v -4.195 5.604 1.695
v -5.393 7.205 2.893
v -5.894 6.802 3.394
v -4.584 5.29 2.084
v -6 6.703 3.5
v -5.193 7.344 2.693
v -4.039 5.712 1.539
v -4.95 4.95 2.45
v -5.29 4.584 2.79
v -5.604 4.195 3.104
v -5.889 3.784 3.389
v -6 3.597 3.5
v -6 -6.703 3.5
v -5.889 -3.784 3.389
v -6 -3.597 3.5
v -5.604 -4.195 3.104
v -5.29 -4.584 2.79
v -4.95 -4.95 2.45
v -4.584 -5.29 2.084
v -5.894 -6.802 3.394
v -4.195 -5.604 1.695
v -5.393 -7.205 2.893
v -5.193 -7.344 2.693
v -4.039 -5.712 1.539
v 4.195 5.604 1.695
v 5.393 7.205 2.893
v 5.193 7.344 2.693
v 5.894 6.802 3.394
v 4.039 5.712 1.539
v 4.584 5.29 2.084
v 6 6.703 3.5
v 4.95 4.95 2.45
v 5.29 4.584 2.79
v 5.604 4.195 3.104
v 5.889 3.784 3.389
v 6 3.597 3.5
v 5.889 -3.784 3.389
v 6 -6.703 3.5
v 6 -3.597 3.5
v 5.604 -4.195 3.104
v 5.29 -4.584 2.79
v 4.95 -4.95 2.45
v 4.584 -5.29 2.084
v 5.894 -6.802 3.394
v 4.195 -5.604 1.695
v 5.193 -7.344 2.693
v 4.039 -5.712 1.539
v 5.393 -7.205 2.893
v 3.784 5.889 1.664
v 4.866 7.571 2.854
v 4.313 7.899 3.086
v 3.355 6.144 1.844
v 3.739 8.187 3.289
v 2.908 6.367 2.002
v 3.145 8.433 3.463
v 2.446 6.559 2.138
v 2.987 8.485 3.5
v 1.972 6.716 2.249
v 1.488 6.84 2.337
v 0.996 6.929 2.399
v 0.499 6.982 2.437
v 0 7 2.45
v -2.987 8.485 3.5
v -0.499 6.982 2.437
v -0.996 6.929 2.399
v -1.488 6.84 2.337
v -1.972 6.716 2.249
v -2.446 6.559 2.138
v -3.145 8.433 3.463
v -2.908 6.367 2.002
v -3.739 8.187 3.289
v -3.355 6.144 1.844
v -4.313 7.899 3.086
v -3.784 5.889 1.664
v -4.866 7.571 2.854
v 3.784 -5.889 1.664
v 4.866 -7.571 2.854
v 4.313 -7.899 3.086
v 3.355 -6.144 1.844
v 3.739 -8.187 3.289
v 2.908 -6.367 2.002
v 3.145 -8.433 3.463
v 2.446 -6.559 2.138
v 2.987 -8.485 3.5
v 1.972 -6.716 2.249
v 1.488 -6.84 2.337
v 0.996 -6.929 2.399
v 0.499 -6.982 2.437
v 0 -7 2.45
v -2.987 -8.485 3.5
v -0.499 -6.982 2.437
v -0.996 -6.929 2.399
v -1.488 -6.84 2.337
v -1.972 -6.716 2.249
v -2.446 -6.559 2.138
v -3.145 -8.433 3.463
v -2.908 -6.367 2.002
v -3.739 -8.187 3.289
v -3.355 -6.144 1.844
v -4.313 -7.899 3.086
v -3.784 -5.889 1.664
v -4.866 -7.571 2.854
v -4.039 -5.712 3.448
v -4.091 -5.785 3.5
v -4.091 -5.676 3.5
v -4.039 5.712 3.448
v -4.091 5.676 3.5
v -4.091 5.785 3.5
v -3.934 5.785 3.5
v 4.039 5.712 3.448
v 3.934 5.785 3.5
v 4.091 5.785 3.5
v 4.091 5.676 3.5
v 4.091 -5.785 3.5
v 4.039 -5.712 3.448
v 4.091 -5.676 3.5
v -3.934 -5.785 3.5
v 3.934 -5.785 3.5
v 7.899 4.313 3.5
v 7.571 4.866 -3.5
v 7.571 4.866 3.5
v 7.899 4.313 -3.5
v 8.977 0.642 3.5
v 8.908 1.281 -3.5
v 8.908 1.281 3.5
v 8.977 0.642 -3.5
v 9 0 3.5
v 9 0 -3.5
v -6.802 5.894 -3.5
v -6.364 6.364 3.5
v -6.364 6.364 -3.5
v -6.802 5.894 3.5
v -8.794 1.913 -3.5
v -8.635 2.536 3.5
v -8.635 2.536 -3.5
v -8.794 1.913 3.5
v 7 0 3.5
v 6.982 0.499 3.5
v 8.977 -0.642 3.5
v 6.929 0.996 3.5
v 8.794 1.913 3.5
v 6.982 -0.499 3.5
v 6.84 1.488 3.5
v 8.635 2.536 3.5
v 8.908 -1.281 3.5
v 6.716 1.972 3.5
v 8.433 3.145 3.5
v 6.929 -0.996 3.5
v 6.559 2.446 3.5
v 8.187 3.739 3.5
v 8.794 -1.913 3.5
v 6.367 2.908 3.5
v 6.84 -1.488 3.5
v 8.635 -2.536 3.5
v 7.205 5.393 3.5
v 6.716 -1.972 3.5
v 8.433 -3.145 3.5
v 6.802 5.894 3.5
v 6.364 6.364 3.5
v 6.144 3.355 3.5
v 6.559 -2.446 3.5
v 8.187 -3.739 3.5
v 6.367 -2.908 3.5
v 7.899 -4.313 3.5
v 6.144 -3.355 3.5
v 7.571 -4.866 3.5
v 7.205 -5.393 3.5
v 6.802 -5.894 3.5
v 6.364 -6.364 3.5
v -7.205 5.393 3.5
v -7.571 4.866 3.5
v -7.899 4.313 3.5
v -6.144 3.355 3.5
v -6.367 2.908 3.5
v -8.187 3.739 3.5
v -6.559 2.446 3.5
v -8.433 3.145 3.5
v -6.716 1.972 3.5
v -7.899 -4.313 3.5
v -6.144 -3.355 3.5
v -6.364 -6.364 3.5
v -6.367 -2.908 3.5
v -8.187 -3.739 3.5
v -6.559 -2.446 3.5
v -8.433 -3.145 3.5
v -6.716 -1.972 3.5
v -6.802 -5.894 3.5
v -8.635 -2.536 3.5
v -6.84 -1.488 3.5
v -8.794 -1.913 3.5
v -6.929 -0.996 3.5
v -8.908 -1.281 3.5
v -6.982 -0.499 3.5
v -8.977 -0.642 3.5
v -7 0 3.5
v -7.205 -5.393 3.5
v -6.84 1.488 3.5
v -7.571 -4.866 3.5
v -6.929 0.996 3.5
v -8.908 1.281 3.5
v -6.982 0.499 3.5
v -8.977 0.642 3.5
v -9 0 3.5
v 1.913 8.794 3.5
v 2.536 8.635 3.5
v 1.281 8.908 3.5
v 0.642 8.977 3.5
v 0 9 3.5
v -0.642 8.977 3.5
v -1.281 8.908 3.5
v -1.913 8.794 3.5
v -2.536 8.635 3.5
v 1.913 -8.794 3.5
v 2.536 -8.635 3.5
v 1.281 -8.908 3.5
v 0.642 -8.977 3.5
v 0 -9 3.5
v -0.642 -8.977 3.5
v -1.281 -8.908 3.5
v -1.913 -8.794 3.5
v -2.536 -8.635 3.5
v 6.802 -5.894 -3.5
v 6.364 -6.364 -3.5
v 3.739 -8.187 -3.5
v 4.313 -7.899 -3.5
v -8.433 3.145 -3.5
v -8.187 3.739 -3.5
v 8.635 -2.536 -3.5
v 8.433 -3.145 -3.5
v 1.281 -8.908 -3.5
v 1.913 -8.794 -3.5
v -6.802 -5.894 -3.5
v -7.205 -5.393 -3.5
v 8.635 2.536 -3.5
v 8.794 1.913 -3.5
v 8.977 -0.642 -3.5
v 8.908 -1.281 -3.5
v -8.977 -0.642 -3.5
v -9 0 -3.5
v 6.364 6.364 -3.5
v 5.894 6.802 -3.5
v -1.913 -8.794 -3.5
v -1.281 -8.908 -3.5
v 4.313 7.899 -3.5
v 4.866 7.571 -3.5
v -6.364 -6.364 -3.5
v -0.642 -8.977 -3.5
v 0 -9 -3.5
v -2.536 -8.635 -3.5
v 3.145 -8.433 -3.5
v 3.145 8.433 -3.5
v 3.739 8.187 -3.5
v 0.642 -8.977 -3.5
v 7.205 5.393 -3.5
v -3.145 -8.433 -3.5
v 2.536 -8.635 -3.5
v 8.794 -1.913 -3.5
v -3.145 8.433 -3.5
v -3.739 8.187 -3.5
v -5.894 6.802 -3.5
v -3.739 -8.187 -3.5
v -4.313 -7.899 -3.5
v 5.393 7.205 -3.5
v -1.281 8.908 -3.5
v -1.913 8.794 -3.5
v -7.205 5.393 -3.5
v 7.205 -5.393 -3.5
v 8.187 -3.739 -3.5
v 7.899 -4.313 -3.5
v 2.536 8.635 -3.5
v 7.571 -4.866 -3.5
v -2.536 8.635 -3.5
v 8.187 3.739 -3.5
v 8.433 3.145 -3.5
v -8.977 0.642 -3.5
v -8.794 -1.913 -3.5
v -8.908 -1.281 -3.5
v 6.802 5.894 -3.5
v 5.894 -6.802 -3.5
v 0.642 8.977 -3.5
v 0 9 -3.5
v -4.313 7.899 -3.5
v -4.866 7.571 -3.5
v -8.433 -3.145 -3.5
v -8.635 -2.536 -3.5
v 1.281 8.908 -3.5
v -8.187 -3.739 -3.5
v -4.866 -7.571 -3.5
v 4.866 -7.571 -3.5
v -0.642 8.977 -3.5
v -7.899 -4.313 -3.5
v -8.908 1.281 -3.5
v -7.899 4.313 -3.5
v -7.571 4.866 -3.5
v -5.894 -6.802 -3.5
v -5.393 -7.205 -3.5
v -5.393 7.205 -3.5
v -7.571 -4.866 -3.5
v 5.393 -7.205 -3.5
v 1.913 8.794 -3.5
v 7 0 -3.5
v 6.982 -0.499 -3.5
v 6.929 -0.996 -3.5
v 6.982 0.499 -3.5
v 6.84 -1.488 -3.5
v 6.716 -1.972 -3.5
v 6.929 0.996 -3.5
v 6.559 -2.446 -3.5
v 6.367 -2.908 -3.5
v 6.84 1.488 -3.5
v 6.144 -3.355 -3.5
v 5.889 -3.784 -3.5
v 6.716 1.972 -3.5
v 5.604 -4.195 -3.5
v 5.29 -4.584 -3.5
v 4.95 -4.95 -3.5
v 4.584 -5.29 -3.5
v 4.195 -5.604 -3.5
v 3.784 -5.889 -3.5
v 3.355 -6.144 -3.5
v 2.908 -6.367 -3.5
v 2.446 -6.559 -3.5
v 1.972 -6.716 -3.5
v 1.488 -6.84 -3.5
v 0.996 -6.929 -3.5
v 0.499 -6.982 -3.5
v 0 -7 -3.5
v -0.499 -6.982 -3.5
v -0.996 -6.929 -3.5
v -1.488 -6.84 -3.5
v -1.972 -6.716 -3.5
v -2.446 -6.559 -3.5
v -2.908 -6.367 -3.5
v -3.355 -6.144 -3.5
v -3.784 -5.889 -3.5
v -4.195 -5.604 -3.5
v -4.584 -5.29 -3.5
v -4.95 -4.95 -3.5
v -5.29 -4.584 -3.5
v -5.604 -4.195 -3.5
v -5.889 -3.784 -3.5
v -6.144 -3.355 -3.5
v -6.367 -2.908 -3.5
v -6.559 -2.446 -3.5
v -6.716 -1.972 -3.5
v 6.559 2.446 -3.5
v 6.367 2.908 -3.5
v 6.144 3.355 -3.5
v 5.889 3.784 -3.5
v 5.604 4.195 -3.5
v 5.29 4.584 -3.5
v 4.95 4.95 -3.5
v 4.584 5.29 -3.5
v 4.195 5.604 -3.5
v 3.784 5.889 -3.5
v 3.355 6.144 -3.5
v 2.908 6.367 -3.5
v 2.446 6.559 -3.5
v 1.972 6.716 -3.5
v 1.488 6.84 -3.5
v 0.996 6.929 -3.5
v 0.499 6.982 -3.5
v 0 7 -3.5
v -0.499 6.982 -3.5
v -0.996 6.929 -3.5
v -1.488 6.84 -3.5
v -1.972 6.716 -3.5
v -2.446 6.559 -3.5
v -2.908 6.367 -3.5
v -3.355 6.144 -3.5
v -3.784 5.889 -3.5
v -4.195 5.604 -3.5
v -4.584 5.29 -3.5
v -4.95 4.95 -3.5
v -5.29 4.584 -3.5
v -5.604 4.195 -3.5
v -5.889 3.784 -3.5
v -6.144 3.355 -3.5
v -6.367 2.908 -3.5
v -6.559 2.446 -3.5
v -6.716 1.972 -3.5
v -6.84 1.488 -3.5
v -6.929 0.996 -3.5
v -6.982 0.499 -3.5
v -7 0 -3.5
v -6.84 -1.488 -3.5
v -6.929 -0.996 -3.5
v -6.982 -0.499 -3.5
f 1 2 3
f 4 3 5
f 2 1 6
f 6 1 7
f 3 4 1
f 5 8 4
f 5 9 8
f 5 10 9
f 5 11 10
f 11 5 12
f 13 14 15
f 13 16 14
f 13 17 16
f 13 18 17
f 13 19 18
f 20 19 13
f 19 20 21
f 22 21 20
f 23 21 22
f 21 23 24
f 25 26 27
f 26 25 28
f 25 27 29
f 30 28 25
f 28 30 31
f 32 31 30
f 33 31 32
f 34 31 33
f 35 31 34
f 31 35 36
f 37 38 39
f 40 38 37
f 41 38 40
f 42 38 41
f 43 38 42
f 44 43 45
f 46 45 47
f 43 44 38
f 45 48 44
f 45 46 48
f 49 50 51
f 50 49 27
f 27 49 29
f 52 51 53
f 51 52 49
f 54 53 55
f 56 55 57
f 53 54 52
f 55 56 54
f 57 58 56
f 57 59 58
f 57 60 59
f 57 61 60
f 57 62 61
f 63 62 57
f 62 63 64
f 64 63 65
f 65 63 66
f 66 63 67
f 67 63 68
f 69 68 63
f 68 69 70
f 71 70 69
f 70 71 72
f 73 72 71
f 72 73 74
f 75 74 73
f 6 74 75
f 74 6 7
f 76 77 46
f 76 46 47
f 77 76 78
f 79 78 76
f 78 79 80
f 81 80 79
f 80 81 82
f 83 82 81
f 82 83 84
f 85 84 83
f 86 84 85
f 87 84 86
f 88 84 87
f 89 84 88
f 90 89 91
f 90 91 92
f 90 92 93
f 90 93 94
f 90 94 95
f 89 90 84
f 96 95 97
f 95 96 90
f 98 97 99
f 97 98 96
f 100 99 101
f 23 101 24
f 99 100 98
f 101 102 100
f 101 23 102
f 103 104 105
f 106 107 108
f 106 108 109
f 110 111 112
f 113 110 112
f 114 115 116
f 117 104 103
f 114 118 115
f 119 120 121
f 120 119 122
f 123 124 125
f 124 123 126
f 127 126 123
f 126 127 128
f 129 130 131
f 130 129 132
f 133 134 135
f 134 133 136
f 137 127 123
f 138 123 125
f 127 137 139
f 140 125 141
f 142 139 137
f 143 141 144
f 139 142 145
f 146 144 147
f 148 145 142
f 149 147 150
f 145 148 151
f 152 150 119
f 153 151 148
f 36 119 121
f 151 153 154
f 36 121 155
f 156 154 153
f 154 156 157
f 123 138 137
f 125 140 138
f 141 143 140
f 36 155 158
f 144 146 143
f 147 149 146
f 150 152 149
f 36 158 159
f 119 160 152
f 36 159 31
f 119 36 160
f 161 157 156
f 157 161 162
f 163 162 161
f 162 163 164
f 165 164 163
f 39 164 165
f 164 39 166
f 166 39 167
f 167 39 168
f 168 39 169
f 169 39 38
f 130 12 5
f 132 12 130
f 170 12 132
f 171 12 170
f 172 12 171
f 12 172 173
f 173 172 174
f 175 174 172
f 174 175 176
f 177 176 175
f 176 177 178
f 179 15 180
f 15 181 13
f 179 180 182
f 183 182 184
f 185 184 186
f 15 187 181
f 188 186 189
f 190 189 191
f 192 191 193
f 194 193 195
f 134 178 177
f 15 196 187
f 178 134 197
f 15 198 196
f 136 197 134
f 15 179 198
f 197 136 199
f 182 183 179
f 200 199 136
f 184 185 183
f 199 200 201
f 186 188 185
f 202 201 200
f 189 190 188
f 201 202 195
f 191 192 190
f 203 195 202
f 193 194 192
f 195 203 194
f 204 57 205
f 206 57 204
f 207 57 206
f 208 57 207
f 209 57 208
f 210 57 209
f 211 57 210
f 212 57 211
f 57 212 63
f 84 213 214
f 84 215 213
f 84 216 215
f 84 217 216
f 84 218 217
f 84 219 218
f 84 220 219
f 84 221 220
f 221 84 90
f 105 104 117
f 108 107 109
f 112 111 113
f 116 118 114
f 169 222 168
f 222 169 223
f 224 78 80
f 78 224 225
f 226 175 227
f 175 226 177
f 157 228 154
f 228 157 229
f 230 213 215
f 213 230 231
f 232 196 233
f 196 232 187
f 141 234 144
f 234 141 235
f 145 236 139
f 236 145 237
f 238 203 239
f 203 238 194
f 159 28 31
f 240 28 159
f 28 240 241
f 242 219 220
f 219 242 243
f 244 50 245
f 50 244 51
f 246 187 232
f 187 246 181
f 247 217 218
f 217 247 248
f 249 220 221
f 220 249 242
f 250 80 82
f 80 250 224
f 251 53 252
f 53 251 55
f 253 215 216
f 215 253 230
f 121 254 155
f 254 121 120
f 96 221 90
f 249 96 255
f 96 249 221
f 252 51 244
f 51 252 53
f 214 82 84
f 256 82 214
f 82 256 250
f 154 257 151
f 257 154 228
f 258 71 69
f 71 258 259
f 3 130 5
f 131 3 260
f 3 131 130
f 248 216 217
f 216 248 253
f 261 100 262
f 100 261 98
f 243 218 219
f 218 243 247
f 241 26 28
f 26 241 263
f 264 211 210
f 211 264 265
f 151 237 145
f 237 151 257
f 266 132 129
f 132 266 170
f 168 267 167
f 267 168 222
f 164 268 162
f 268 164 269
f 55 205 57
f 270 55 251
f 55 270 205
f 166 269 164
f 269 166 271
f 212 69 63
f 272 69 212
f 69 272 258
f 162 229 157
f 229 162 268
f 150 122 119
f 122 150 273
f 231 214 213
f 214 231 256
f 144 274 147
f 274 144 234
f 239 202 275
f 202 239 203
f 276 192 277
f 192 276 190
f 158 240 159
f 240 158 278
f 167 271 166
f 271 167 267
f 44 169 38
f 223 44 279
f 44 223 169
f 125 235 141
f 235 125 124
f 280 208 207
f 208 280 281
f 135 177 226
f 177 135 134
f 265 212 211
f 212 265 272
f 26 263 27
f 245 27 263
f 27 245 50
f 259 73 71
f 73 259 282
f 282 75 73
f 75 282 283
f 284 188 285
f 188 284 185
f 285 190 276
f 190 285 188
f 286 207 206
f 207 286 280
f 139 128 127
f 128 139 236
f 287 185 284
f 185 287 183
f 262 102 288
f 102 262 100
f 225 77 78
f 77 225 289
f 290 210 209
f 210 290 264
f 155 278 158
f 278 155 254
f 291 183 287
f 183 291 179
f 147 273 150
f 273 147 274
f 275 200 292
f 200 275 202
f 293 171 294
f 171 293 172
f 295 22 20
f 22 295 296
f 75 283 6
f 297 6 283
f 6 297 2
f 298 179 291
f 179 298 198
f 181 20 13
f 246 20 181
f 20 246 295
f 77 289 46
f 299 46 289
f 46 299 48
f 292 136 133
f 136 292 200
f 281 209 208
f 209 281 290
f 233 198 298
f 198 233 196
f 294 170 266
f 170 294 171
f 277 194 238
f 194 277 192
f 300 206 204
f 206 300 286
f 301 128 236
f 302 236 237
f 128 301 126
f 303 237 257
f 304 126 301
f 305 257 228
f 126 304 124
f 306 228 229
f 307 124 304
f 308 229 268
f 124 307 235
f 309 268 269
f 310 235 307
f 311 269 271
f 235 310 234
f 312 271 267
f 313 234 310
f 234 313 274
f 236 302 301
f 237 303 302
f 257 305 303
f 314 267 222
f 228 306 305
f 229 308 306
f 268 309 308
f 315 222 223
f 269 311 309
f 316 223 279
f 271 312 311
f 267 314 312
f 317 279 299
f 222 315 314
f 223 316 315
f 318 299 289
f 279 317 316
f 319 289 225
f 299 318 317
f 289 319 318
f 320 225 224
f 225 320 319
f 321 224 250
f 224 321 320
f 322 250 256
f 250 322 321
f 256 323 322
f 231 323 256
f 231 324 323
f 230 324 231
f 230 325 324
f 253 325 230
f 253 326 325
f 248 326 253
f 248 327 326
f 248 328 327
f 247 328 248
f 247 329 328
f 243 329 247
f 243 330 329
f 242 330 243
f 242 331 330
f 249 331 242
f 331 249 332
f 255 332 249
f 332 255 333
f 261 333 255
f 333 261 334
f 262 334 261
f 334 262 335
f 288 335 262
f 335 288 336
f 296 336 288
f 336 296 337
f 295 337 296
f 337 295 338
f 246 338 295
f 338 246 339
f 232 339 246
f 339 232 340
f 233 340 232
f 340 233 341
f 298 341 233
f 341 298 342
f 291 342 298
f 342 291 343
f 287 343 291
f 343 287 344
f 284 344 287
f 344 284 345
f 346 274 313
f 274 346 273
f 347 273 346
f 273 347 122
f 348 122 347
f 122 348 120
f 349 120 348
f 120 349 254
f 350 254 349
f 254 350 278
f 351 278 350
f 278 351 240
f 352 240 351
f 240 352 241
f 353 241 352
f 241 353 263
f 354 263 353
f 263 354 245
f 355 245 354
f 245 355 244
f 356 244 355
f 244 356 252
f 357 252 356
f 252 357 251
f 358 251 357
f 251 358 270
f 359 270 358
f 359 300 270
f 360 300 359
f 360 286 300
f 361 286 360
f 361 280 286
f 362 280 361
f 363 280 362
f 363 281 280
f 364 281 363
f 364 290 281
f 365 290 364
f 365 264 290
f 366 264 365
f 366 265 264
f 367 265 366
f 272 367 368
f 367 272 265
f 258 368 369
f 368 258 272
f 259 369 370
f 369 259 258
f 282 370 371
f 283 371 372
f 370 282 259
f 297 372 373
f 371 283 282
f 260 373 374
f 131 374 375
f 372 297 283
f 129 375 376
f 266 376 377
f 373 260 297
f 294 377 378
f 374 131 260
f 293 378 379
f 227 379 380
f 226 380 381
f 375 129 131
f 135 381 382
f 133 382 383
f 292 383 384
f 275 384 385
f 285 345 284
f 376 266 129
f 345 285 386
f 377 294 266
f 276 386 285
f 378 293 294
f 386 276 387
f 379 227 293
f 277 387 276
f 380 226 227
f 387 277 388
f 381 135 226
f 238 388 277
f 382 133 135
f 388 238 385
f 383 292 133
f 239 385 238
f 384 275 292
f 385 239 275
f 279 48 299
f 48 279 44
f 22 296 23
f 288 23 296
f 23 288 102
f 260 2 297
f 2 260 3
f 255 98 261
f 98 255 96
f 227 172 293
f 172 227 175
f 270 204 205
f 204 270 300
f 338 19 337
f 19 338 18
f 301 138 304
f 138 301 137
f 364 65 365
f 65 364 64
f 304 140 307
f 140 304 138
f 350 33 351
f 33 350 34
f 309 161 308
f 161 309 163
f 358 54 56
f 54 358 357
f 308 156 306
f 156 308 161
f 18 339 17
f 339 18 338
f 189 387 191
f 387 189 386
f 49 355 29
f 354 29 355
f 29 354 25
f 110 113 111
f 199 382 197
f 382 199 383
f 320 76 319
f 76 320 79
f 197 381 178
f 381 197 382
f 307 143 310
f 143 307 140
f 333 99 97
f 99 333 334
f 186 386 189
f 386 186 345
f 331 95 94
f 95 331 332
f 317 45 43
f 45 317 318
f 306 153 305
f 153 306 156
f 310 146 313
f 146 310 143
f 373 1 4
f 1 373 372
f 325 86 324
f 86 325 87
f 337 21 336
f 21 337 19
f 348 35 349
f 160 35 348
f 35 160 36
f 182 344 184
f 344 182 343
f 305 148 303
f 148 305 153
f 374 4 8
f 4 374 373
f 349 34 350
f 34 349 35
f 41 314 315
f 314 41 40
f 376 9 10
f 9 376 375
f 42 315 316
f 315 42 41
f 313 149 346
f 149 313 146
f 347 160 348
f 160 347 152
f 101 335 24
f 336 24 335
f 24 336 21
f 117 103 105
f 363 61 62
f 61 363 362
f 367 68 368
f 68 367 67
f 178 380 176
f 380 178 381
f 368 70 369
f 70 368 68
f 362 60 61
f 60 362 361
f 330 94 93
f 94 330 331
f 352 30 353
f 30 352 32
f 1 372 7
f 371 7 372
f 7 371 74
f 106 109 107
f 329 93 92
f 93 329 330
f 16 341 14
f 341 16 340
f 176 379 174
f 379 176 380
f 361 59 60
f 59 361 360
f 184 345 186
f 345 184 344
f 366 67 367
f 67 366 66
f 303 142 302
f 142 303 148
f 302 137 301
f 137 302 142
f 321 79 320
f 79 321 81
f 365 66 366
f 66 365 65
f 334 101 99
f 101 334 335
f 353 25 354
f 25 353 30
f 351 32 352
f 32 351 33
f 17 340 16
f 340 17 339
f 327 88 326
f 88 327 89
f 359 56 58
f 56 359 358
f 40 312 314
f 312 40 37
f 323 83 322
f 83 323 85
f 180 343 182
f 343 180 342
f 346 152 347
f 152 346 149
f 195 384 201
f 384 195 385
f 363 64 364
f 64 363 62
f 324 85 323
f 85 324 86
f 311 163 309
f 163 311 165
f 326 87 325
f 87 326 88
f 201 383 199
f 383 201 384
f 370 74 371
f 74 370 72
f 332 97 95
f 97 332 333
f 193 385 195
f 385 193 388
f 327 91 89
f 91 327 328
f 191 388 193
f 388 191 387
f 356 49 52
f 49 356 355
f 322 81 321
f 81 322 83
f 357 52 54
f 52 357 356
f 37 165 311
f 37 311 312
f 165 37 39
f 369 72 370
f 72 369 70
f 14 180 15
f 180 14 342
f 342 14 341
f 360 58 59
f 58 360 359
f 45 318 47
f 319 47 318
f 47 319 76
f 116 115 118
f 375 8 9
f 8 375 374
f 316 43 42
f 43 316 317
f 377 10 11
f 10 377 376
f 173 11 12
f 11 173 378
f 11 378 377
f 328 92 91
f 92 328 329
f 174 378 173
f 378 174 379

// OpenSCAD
version = 4;

arete = 20;
paroi = 1.35;
trou_bouchon = 0;
diametreTrouBouchon = 1.5;
bottomHole = 0;
bottomHoleDiameter = 1.2;
vertexHole = 0;
vertexHolesDiameter = 1;
sideHole = 0;
sideHolesDiameter = 1.2;

// distance entre la paroi extérieure et la découpe
// minimum semble etre >nozzle_diameter pour Zortrax M200
offset_decoupe_bouchon = 0.42;

echelleReductionAjustementBouchon = 0.98;
r = 0.19; // résolution d'impression sur l'axe Z

externalRadius = arete;
internalRadius = arete_from(int_radius(arete)-paroi);
echo(internalRadius=internalRadius);

use <../lib/Cuboctahedron.scad>;
use <../lib/Engineering_tools.scad>;

dihedralAngle = 125.264;

render(convexity=2)
//forme_creuse();
//decoupe_bouchon();
// corps_ouvert();
// bouchon();
//trou();
support();

module corps_ouvert() {
  // rotation pour face triangle
  // rotate([180 - dihedralAngle, 0, 0]) rotate([0, 0, 45])

  difference() {
    forme_creuse();
    decoupe_bouchon();
    if (bottomHole) {
      translate([0, 0, -externalRadius+1])
      #cylinder(paroi*3, r=bottomHoleDiameter/2, $fn=22);
    }
    if (sideHole) {
      rotate([0, 0, 45])
      rotate([180 - dihedralAngle, 0, 0])
      translate([0, 0, externalRadius*.6])
      #cylinder(paroi*3, r=bottomHoleDiameter/2, $fn=22);
    }
    if (vertexHole) {
      trou_pointe();
    }
  }
}

module bouchon() {
  // rotate([-90, 45, 0])
  scale([echelleReductionAjustementBouchon, echelleReductionAjustementBouchon, 0.99])
  difference () {
    intersection() {
        // forme_creuse();
        decoupe_bouchon(echelleReductionAjustementBouchon);
    }
    if (vertexHole) {
      trou_pointe();
    } else if (trou_bouchon) {
      trou();
    }
  }
}

module trou() {
    rotate([0, 0, 0])
    translate([0, 0, externalRadius*0.5])
    cylinder(30, r=diametreTrouBouchon/2, $fn=22);
}

module trou_pointe() {
    rotate([90, 0, 45])
    translate([0, 0, externalRadius*.7])
    #cylinder(paroi*3, r=bottomHoleDiameter/2, $fn=22);
}

module forme_creuse() {
  difference() {
    cuboctahedron(externalRadius);
    cuboctahedron(internalRadius);
  }
}

module decoupe_bouchon(scale=1) {
  distance = int_radius(arete)-paroi/2;
  d = arete-offset_decoupe_bouchon*2;
  rotate([0,0,45]) translate([0,0, distance])
    cube([d, d, paroi], center=true);
}

module support() {
  $fn=88;
  translate([0,0,arete+1-7/2])
  difference() {
    translate([0,0,-arete-1])
    cylinder(h=7, r=9);
    translate([0,0,-arete-2])
    cylinder(h=10, r=7);
    // tube(r=12, thickness=1, height=10, center=false, outline=false)
    rotate_on_vertex() #corps_ouvert();
  }
}

module rotate_on_vertex() {
    rotate([0, 45, 0]) rotate([0, 0, 0]) children();
}
